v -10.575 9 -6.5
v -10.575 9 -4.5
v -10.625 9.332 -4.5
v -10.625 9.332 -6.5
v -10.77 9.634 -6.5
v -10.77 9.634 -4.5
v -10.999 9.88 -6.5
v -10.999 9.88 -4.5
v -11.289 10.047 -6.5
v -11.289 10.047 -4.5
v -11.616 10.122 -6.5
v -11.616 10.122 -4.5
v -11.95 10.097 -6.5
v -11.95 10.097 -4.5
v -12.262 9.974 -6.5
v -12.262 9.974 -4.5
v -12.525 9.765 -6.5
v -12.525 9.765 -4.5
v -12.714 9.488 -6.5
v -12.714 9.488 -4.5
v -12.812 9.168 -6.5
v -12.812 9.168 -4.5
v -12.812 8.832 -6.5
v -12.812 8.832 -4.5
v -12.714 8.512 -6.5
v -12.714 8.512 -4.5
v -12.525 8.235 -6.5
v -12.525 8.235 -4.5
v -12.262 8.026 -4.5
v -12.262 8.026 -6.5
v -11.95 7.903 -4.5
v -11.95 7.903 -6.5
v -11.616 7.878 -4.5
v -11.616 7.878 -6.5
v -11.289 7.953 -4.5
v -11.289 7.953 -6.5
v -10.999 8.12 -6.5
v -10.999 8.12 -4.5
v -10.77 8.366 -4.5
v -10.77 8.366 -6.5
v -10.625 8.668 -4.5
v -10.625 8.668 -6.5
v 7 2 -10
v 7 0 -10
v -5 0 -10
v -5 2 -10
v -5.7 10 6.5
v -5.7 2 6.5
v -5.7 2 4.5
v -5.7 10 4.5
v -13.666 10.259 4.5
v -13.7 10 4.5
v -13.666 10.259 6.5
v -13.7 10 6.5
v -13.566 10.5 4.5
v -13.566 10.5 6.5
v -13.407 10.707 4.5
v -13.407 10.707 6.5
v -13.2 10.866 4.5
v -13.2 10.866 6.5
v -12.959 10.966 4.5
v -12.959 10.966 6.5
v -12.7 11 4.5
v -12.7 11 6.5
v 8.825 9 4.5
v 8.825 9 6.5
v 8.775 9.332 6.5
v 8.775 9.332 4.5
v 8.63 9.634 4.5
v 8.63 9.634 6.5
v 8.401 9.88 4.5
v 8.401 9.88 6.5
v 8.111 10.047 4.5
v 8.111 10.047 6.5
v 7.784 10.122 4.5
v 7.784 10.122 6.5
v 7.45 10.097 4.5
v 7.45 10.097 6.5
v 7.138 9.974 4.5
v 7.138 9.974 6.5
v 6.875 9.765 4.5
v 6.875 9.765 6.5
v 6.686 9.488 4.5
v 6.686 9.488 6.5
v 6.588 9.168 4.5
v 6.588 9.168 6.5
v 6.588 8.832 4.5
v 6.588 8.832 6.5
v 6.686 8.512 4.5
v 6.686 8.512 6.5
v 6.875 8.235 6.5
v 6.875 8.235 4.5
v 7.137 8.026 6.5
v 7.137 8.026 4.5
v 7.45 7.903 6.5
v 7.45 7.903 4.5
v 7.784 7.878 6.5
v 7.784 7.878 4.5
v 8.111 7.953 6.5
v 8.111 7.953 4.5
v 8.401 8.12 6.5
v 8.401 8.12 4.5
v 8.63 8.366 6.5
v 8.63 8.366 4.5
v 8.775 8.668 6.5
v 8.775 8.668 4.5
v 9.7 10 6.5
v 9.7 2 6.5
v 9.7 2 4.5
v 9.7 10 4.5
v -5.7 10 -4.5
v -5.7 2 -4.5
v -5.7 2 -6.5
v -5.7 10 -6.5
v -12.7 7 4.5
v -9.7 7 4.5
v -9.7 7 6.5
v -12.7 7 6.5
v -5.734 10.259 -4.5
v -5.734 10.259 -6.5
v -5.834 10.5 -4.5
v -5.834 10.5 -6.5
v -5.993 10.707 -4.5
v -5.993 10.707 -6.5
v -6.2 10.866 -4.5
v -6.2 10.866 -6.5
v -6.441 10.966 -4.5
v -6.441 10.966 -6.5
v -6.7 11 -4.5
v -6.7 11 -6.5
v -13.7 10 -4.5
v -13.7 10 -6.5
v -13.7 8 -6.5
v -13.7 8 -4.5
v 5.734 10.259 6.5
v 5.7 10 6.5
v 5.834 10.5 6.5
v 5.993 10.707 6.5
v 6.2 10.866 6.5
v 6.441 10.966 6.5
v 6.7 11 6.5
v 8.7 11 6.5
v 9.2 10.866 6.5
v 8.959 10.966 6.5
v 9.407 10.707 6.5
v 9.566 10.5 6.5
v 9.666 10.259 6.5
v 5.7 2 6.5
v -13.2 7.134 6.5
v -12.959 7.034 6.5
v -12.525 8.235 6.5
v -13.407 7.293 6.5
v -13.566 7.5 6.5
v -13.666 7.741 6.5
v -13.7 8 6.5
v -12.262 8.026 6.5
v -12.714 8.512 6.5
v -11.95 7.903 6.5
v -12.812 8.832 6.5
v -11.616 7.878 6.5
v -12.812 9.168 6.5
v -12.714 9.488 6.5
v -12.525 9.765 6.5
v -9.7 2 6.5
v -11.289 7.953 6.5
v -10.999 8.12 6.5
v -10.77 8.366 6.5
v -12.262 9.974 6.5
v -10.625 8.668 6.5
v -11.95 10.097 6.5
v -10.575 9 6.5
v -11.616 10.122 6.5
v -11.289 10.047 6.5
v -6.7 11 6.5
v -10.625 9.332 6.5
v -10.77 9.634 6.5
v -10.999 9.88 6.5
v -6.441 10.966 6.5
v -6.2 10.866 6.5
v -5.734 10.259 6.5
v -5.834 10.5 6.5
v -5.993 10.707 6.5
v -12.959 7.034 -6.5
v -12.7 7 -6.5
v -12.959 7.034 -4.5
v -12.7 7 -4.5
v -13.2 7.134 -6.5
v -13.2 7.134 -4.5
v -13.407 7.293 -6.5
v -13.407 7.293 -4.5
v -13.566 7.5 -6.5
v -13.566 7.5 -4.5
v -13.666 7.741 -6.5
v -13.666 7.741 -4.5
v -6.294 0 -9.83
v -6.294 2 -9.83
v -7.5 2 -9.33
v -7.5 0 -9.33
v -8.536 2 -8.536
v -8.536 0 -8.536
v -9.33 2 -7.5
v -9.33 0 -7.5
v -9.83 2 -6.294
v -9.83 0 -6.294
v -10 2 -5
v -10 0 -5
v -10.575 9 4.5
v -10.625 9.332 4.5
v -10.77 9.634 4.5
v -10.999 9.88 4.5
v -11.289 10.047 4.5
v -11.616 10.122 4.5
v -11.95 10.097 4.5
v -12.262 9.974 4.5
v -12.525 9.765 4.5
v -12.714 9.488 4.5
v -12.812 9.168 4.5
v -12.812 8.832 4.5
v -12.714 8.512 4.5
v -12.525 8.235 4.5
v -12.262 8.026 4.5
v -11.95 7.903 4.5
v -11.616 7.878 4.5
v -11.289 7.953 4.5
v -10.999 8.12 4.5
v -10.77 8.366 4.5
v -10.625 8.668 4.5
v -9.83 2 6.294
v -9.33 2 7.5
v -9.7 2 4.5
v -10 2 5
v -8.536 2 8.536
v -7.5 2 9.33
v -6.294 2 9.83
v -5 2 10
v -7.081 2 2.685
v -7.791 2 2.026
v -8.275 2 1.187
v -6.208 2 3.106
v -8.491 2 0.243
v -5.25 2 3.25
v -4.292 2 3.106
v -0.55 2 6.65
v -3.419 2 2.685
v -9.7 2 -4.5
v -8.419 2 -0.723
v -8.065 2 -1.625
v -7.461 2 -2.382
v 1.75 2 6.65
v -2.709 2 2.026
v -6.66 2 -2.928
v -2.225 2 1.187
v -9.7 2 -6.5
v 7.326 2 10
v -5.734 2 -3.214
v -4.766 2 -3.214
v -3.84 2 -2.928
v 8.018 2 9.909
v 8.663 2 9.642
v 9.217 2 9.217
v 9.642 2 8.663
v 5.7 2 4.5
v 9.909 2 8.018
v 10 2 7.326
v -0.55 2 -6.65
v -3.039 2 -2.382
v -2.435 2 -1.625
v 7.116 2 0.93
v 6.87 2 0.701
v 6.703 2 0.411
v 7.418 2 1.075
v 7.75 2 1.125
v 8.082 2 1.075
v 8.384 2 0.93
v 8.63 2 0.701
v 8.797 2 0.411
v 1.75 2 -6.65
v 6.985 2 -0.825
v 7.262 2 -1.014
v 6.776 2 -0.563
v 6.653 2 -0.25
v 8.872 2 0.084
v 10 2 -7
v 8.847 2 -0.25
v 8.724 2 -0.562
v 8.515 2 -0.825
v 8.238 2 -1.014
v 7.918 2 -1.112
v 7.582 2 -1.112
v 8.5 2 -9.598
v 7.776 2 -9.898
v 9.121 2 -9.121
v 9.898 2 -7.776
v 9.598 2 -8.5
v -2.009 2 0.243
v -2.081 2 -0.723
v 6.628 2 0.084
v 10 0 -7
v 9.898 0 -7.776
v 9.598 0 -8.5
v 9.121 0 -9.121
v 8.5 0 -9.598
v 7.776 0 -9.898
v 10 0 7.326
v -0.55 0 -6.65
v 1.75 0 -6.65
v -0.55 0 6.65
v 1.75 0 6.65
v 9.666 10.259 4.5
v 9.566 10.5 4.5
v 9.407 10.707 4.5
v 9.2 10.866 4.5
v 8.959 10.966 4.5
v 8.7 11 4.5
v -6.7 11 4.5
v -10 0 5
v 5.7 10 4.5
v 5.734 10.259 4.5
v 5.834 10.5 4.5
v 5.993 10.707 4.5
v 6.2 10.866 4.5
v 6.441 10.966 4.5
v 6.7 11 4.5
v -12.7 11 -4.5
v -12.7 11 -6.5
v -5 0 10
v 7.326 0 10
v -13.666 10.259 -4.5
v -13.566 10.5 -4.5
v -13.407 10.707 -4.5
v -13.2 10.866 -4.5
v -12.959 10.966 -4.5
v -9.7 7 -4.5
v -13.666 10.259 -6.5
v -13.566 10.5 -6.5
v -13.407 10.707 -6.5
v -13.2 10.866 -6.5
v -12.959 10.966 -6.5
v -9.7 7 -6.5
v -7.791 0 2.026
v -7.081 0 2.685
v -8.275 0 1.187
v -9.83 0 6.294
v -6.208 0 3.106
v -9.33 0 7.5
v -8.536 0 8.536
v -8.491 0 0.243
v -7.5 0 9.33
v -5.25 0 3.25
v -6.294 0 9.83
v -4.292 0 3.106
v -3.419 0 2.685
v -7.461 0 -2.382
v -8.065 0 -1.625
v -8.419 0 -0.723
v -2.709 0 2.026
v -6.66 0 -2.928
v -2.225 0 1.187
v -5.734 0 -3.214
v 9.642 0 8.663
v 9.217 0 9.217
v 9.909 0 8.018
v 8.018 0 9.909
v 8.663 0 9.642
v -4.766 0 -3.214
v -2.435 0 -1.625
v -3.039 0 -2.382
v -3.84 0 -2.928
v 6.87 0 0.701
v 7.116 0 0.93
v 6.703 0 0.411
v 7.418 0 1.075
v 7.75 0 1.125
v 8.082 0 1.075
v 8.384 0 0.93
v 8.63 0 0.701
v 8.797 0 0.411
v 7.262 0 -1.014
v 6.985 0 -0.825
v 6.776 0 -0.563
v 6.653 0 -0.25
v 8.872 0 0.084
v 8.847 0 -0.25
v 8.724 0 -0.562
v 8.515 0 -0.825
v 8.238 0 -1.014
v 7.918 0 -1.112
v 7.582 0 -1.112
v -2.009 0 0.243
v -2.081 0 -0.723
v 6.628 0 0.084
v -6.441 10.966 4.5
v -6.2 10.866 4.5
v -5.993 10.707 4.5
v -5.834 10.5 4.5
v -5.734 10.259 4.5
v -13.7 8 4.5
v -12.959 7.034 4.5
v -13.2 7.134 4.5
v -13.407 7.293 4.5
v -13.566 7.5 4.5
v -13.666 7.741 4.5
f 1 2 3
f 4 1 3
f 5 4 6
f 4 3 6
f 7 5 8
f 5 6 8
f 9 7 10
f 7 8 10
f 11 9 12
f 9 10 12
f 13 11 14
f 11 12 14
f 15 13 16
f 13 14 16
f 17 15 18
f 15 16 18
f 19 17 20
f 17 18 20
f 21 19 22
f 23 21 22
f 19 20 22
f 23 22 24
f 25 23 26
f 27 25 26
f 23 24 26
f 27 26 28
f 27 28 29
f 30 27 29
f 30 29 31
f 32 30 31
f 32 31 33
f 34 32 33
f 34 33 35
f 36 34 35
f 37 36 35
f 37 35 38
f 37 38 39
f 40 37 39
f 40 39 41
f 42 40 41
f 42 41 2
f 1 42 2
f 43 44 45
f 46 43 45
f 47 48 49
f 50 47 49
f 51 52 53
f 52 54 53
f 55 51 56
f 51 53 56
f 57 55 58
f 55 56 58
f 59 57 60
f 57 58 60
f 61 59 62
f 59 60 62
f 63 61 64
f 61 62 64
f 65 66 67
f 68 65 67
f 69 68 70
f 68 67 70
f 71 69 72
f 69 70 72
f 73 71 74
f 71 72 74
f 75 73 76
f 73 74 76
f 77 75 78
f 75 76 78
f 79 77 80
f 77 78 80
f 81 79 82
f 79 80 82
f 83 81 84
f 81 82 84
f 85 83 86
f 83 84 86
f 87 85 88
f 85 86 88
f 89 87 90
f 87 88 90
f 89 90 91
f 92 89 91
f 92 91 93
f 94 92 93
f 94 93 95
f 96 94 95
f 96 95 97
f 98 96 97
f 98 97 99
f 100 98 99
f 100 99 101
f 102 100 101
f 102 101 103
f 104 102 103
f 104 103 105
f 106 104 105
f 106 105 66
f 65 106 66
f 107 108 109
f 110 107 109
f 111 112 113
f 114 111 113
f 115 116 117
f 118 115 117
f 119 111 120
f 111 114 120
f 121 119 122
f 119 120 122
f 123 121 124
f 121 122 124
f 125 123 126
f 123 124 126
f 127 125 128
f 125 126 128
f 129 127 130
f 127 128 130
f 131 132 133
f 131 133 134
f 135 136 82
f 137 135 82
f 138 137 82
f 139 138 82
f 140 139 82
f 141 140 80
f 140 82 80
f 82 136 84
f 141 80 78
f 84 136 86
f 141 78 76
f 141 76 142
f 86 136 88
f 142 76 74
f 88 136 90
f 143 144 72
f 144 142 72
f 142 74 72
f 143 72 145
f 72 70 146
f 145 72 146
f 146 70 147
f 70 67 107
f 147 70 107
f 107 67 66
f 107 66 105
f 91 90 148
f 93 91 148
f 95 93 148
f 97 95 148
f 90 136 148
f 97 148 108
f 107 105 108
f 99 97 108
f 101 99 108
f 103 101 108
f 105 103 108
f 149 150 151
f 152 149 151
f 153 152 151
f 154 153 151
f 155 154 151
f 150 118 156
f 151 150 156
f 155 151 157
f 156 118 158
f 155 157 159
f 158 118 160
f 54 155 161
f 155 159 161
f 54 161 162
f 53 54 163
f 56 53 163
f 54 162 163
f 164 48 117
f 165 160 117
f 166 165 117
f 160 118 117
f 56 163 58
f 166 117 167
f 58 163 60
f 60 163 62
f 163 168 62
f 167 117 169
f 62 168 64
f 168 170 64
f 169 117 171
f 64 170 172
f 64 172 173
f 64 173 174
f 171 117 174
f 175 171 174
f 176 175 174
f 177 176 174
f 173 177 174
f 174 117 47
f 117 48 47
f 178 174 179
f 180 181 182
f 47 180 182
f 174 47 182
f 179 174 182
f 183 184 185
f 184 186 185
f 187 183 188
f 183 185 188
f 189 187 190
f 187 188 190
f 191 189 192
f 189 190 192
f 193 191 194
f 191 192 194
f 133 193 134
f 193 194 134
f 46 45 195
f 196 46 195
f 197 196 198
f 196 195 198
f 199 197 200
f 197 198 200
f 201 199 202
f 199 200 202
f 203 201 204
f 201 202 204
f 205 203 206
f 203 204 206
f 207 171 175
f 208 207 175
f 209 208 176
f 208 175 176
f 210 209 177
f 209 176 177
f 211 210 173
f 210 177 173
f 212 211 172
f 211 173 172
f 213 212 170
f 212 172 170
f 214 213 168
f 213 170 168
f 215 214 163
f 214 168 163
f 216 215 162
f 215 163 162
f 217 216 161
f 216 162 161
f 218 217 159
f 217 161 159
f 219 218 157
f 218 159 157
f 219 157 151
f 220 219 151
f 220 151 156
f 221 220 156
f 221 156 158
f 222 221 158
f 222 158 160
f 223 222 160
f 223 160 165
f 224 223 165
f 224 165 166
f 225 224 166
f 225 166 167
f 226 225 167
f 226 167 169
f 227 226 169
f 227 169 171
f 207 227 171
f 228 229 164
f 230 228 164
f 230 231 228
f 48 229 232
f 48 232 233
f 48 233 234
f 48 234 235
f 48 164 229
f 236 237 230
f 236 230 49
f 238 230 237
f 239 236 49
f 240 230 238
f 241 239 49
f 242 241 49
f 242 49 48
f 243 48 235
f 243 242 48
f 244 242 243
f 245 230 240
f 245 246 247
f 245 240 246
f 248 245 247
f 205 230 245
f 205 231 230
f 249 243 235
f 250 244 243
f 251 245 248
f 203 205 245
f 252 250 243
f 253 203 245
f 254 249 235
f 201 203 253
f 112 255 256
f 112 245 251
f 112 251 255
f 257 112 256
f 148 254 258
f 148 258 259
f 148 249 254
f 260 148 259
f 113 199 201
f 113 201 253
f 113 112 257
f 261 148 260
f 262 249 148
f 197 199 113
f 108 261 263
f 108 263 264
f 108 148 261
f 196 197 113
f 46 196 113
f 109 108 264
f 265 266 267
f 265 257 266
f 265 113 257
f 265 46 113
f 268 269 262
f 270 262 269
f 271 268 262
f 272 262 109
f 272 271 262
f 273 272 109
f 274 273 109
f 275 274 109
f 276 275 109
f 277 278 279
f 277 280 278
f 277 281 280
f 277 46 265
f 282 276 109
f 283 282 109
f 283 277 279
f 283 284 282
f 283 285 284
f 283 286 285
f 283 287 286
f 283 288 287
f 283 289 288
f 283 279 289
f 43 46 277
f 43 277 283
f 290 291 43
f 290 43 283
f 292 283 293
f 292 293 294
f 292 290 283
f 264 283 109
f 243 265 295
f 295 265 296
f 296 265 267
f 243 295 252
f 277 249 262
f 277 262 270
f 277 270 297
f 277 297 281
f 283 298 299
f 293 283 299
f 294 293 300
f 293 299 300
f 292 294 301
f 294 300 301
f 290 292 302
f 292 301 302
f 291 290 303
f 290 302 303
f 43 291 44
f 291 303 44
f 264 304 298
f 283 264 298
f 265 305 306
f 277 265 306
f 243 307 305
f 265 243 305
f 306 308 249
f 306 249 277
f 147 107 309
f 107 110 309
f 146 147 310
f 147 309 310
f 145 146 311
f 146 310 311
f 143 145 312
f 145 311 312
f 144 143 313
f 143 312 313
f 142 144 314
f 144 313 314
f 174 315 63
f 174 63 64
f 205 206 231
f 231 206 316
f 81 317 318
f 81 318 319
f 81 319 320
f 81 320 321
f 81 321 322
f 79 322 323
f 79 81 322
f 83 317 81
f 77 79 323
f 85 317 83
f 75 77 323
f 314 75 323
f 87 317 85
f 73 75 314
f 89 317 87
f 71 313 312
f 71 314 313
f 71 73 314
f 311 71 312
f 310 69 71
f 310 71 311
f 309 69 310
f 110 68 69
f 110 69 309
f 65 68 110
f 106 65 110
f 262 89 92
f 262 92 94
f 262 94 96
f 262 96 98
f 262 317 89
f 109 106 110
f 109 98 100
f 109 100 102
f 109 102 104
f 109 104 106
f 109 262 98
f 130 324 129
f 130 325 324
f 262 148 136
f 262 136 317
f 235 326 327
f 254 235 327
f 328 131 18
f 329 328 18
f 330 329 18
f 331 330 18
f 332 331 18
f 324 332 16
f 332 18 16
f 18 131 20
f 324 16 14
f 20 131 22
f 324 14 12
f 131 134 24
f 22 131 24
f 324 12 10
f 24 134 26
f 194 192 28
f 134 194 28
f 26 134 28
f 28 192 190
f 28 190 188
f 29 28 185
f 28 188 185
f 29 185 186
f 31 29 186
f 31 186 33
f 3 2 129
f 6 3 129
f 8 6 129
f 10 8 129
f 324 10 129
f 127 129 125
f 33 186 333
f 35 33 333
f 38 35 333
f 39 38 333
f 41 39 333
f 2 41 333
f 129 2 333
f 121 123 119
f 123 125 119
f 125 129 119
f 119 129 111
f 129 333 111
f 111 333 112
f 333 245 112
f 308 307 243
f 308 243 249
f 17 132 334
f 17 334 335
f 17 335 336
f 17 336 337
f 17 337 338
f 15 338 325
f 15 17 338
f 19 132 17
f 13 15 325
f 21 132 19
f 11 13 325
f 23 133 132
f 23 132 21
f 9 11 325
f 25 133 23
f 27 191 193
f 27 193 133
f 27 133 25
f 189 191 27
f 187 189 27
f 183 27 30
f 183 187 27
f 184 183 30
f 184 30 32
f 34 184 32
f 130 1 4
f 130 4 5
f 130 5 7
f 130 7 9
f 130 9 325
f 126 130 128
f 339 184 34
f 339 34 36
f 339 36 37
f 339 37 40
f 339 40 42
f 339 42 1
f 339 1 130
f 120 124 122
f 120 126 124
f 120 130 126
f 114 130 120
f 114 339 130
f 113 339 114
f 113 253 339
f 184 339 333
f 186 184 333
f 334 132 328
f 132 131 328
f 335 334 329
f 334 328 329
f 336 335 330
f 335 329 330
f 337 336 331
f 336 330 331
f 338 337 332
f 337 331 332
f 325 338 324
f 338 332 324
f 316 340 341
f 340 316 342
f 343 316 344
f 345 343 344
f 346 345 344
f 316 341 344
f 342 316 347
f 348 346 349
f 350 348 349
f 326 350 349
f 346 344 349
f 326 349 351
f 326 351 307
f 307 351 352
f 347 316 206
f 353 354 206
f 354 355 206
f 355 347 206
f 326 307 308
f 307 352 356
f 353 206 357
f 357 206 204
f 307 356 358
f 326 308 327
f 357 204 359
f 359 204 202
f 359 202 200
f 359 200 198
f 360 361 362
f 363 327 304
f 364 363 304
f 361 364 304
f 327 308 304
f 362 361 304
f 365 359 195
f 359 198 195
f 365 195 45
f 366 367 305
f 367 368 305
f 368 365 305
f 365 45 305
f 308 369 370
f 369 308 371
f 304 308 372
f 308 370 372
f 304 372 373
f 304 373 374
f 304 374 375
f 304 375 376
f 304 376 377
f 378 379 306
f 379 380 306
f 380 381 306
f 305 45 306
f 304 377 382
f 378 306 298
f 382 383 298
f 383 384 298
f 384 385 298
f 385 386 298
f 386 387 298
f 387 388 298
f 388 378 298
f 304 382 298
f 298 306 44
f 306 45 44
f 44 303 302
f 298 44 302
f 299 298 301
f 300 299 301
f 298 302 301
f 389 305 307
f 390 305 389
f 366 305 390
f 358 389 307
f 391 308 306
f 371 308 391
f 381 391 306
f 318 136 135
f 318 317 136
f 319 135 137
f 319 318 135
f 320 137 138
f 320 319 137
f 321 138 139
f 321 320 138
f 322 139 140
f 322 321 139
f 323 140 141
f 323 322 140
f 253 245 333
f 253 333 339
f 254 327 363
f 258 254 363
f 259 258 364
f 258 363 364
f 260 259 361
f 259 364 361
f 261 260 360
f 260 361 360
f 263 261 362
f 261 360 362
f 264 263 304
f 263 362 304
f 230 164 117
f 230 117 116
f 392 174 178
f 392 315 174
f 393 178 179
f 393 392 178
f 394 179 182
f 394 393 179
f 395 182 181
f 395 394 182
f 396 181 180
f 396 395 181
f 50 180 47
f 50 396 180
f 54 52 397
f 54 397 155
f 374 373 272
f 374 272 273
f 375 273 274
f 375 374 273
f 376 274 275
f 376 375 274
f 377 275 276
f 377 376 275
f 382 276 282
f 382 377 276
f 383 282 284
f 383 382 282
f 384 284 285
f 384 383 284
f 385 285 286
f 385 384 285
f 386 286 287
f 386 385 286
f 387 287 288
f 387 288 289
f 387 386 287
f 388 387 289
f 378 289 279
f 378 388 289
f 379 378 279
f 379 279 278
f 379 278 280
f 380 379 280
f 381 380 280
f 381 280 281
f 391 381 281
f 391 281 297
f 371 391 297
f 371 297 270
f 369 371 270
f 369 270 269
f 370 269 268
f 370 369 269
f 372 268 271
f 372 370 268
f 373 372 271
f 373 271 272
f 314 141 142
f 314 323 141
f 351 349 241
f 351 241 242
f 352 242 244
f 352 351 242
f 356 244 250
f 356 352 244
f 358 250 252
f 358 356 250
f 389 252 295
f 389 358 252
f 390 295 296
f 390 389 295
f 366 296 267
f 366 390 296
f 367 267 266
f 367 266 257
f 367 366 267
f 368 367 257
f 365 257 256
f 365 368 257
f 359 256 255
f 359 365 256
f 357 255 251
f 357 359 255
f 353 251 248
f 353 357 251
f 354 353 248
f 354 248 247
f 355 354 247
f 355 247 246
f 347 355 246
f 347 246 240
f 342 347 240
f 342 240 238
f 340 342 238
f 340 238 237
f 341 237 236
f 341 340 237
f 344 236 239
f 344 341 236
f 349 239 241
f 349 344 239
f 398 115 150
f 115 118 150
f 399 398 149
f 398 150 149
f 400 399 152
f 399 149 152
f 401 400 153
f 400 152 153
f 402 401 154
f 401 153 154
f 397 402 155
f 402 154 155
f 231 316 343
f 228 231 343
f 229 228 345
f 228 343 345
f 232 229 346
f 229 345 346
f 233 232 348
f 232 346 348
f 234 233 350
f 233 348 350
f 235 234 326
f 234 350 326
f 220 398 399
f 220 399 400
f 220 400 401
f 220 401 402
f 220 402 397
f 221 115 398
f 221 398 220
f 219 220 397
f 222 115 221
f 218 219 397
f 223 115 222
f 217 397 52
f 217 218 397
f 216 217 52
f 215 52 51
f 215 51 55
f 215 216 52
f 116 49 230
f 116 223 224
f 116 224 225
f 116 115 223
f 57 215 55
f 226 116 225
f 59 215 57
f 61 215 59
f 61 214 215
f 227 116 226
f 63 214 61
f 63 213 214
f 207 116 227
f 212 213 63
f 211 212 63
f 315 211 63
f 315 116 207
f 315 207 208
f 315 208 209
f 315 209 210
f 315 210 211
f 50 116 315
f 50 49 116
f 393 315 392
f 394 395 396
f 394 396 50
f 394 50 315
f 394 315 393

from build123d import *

# Parameters (mm, degrees)
CROQUIS1_R              = 1.125
CROQUIS1_R_2            = 3.25
CROQUIS1_W              = 2.3
CROQUIS1_H              = 13.3
SALIENTE_EXTRUIR1_DEPTH = 2
CROQUIS2_W              = 4
CROQUIS2_H              = 2
SALIENTE_EXTRUIR2_DEPTH = 9
CROQUIS3_R              = 1.125
CORTAR_EXTRUIR1_DEPTH   = 13
CROQUIS5_W              = 2
CROQUIS5_H              = 4
SALIENTE_EXTRUIR3_DEPTH = 4
CROQUIS6_R              = 1.125
CORTAR_EXTRUIR3_DEPTH   = 25.102696945
REDONDEO2_R             = 1


with BuildPart() as part:
    # Croquis1 → Saliente-Extruir1 (new body)
    with BuildSketch(Plane(origin=(0, 0, 0), x_dir=(1, 0, 0), z_dir=(0, 1, 0))):
        with BuildLine():
            Line((-5, -10), (7.32626704, -10))
            ThreePointArc((7.32626704, -10), (9.216881747, -9.216881747), (10, -7.32626704))
            Line((10, -7.32626704), (10, 7))
            ThreePointArc((10, 7), (9.121320344, 9.121320344), (7, 10))
            Line((7, 10), (-5, 10))
            ThreePointArc((-5, 10), (-8.535533906, 8.535533906), (-10, 5))
            Line((-10, 5), (-10, -5))
            ThreePointArc((-10, -5), (-8.535533906, -8.535533906), (-5, -10))
        make_face()
        with Locations(Location((7.75, 0, 0), (0, 0, 270))):
            Circle(CROQUIS1_R, mode=Mode.SUBTRACT)
        with Locations(Location((-5.25, 0, 0), (0, 0, 270))):
            Circle(CROQUIS1_R_2, mode=Mode.SUBTRACT)
        with Locations((0.6, 0)):
            Rectangle(CROQUIS1_W, CROQUIS1_H, mode=Mode.SUBTRACT)
    extrude(amount=SALIENTE_EXTRUIR1_DEPTH)

    # Croquis2 → Saliente-Extruir2 (add)
    with BuildSketch(Plane(origin=(0, 2, 0), x_dir=(1, 0, 0), z_dir=(0, 1, 0))):
        with Locations((-7.7, 5.5)):
            Rectangle(CROQUIS2_W, CROQUIS2_H)
        with Locations((-7.7, -5.5)):
            Rectangle(CROQUIS2_W, CROQUIS2_H)
        with Locations((7.7, -5.5)):
            Rectangle(CROQUIS2_W, CROQUIS2_H)
    extrude(amount=SALIENTE_EXTRUIR2_DEPTH)

    # Croquis3 → Cortar-Extruir1 (cut)
    with BuildSketch(Plane.XY.offset(6.5)):
        with Locations((7.7, 9)):
            Circle(CROQUIS3_R)
    extrude(amount=-CORTAR_EXTRUIR1_DEPTH, mode=Mode.SUBTRACT)

    # Croquis5 → Saliente-Extruir3 (add)
    with BuildSketch(Plane.ZY.offset(9.7)):
        with Locations((5.5, 9)):
            Rectangle(CROQUIS5_W, CROQUIS5_H)
        with Locations((-5.5, 9)):
            Rectangle(CROQUIS5_W, CROQUIS5_H)
    extrude(amount=SALIENTE_EXTRUIR3_DEPTH)

    # Croquis6 → Cortar-Extruir3 (cut, through all)
    with BuildSketch(Plane.XY.offset(6.5)):
        with Locations((-11.7, 9)):
            Circle(CROQUIS6_R)
    extrude(amount=-CORTAR_EXTRUIR3_DEPTH, mode=Mode.SUBTRACT)

    # Redondeo2
    redondeo2_edges = [part.edges().sort_by_distance(p)[0] for p in [
        (-13.7, 11, -5.5),
        (-13.7, 7, -5.5),
        (-5.7, 11, -5.5),
        (-5.7, 11, 5.5),
        (5.7, 11, 5.5),
        (9.7, 11, 5.5),
        (-13.7, 7, 5.5),
        (-13.7, 11, 5.5),
    ]]
    fillet(redondeo2_edges, radius=REDONDEO2_R)


solid = part.part
